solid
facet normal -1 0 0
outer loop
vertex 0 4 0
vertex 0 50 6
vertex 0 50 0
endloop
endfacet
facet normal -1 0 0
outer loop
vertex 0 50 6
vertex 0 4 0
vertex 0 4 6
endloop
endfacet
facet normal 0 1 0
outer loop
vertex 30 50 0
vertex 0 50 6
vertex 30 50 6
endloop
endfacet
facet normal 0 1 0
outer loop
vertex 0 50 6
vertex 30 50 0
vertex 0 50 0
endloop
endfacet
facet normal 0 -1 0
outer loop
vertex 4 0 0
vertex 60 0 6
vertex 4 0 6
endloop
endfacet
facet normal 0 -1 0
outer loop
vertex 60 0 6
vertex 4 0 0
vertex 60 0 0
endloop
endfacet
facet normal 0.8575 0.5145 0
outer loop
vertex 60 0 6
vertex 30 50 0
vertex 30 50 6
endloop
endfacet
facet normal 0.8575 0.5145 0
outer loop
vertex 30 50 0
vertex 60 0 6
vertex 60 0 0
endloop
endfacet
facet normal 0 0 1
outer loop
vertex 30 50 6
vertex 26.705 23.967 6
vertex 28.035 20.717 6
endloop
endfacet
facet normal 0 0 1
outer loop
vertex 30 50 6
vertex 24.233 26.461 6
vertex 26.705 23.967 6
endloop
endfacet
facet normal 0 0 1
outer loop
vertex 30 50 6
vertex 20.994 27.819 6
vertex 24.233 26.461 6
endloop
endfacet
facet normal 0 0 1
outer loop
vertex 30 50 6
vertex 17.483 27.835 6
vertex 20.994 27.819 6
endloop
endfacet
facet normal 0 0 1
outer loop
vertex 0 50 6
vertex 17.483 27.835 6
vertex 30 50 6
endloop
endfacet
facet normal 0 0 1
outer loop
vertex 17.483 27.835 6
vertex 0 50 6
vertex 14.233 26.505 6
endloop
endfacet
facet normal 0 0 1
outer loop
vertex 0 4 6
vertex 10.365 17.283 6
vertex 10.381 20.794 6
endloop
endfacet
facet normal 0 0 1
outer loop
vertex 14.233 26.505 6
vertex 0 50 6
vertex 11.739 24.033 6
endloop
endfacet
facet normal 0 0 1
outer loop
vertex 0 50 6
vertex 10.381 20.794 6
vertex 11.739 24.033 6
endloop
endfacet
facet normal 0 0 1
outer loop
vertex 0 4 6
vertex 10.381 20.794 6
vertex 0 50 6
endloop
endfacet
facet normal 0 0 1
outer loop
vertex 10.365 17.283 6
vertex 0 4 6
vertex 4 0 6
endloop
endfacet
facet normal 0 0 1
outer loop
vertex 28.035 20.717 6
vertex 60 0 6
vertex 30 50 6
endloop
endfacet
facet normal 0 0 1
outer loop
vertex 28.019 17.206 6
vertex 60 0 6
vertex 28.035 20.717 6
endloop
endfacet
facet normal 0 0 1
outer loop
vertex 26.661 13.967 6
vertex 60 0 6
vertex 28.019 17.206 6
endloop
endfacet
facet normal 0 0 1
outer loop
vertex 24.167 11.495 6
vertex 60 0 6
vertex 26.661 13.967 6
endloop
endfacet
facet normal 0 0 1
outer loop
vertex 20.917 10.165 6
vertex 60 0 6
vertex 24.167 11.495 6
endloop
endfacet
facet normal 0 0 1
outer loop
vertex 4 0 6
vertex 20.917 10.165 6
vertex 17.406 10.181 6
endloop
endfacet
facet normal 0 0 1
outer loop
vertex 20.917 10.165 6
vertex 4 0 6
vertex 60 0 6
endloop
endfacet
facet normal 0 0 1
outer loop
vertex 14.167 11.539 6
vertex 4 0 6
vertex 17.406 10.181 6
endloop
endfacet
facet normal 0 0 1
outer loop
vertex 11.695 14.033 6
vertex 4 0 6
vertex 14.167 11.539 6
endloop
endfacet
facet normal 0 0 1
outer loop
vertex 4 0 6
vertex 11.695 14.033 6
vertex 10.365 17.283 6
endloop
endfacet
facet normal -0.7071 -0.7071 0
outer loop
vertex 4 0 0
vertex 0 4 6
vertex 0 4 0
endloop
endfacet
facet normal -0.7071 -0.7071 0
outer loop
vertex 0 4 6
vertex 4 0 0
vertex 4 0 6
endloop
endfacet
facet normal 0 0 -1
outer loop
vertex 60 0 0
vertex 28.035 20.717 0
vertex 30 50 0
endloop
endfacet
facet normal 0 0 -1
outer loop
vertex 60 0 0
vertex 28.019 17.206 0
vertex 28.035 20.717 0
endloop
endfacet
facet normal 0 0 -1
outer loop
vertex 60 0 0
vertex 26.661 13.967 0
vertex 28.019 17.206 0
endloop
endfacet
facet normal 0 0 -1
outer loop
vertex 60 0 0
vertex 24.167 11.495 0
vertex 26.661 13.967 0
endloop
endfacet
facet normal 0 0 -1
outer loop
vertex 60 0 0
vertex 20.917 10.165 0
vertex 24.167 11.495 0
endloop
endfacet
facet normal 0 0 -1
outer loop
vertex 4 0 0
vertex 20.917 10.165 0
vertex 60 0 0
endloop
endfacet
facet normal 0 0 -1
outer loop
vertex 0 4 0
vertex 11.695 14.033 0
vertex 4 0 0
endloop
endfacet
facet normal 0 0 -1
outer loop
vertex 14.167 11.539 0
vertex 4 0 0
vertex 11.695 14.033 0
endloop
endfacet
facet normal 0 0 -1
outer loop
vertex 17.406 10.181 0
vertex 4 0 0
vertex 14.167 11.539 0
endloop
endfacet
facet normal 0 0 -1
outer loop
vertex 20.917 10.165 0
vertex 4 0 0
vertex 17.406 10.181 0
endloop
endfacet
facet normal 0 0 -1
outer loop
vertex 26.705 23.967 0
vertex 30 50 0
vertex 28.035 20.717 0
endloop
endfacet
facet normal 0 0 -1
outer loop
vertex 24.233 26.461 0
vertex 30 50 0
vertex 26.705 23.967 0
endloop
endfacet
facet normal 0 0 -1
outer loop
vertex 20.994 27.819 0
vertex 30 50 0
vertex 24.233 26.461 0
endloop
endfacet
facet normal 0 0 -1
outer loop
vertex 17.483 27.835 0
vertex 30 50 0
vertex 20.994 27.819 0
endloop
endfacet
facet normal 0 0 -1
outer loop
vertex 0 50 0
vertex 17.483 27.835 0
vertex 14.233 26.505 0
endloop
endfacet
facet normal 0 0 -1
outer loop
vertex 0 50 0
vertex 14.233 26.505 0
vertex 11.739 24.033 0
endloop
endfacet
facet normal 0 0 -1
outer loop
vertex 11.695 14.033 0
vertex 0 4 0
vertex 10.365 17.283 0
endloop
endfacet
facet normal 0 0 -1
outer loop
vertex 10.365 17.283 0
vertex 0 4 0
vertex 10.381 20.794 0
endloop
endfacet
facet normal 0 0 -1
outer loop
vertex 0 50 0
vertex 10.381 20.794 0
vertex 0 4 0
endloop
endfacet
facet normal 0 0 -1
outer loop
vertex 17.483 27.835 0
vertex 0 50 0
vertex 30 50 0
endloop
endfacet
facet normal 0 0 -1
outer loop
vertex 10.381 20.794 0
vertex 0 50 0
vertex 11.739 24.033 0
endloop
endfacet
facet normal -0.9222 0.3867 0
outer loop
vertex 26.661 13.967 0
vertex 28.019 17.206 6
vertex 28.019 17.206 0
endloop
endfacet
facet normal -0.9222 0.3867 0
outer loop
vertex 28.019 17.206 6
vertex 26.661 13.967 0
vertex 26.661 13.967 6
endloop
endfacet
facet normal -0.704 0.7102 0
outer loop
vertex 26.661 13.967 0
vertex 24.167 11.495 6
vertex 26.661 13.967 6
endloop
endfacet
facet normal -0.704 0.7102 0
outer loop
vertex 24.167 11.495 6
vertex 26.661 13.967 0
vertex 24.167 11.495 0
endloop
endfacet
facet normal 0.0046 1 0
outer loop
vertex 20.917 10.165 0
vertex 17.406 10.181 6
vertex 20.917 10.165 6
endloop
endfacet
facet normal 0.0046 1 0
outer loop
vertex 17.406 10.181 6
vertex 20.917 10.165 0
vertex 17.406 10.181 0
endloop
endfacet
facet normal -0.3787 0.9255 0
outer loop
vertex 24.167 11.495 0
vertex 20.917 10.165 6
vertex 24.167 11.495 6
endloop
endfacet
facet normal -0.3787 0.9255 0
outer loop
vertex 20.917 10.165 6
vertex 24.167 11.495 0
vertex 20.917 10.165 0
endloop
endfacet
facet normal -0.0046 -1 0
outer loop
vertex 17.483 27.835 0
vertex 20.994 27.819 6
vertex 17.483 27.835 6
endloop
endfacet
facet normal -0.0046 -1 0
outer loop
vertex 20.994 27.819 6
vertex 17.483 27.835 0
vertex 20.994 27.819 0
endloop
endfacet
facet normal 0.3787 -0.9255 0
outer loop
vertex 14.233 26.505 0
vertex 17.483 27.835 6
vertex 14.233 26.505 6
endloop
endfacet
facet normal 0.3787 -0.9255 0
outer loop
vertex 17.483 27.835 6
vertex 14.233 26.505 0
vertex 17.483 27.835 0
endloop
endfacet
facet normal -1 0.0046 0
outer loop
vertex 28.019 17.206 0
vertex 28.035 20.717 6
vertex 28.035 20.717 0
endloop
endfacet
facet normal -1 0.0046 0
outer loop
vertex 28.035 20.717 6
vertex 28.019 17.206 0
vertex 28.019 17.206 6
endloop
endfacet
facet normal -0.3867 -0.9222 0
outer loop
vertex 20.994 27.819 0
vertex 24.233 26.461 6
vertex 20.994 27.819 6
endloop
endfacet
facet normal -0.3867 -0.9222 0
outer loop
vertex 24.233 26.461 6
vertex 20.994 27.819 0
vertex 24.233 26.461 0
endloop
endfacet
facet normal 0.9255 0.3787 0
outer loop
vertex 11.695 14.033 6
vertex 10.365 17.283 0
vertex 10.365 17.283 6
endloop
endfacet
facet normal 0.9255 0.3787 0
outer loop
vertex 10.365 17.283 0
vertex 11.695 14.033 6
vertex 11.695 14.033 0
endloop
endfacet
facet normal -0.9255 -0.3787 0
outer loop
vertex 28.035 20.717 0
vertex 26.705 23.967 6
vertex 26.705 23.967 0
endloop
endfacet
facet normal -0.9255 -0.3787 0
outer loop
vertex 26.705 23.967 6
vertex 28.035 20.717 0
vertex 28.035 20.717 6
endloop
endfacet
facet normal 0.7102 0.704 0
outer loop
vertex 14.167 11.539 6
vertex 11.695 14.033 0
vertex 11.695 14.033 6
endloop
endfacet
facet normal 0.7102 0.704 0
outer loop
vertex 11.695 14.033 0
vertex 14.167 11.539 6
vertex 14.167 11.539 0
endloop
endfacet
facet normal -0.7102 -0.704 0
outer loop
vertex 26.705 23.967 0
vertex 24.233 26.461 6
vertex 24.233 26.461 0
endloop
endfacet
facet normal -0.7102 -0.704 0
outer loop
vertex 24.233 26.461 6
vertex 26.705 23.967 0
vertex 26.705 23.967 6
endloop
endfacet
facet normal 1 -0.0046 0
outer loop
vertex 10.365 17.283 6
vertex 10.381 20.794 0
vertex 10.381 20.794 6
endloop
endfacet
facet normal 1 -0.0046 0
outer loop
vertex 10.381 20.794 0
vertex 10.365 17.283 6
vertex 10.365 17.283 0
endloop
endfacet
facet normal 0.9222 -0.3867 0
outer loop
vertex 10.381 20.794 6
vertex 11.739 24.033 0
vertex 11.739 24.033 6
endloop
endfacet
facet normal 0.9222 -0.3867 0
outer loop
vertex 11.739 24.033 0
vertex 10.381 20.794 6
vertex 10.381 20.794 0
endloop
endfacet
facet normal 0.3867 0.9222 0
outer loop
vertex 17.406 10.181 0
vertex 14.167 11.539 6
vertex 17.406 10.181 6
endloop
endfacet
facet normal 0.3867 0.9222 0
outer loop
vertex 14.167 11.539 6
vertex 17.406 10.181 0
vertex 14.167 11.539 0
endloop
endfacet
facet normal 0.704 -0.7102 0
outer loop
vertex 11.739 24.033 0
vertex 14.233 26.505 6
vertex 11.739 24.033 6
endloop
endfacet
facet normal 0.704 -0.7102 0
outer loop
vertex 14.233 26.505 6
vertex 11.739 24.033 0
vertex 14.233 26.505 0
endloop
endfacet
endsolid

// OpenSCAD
$fn = 32;

// ----------------------------------------------------------------------
// Bracket plate: gusset 60 x 50
// ----------------------------------------------------------------------

// --- parameters (mm) ---
hole_r = 3.5;             // bolt hole radius
plate_t = 6;              // plate thickness, Z (extrusion height)
gus_a = 60;               // base length
gus_b = 50;               // height
top_x = 30;               // top edge X of the angled cut
light_r = 9;              // lightening hole radius

light_d = 2 * light_r;

profile = [[4, 0], [30, 0], [60, 0], [30, 50], [0, 50], [0, 4]];  // primary outline, 6 points, counter clockwise
void_1 = [[28.035, 20.717], [26.705, 23.967], [24.233, 26.461], [20.994, 27.819], [17.483, 27.835], [14.233, 26.505], [11.739, 24.033], [10.381, 20.794], [10.365, 17.283], [11.695, 14.033], [14.167, 11.539], [17.406, 10.181], [20.917, 10.165], [24.167, 11.495], [26.661, 13.967], [28.019, 17.206]];  // lightening hole, 16 points

// --- the one profile operation ---
difference() {
  linear_extrude(height = plate_t) polygon(points = profile);
  translate([0, 0, -1])
    linear_extrude(height = plate_t + 2) polygon(points = void_1);
}
